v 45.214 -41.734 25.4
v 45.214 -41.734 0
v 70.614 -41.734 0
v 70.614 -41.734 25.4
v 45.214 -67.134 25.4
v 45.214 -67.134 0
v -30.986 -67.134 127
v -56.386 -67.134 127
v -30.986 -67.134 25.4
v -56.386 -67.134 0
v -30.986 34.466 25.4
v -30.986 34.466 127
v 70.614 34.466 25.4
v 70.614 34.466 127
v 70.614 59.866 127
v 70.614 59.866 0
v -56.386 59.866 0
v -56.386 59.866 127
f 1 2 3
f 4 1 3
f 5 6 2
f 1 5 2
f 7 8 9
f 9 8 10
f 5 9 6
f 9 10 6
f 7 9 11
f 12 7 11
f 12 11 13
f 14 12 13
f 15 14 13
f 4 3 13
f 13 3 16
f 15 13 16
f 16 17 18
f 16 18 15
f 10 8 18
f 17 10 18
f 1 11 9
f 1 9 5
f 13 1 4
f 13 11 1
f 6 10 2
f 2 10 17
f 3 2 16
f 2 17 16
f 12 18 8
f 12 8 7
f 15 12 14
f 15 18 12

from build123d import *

# Parameters (mm, degrees)
F0_W     = 127
F0_H     = 127
F1_DEPTH = 25.4
F2_W     = 25.4
F2_H     = 127
F3_DEPTH = 101.6
F4_W     = 101.6
F4_H     = 25.4
F5_DEPTH = 101.6
F6_W     = 25.4
F6_H     = 25.4
F7_DEPTH = 25.4


with BuildPart() as f1:
    # F0 (on Top) → F1 (new body)
    with BuildSketch(Plane.XY):
        with Locations((7.114284, -3.634389)):
            Rectangle(F0_W, F0_H)
    extrude(amount=F1_DEPTH)

    # F2 (on face) → F3 (join)
    with BuildSketch(Plane.XY.offset(25.4)):
        with Locations((-43.685716, -3.634389)):
            Rectangle(F2_W, F2_H)
    extrude(amount=F3_DEPTH)

    # F4 (on face) → F5 (join)
    with BuildSketch(Plane.XY.offset(25.4)):
        with Locations((19.814284, 47.165611)):
            Rectangle(F4_W, F4_H)
    extrude(amount=F5_DEPTH)

    # F6 (on face) → F7 (cut)
    with BuildSketch(Plane.XY.offset(25.4)):
        with Locations((57.914284, -54.434389)):
            Rectangle(F6_W, F6_H)
    extrude(amount=-F7_DEPTH, mode=Mode.SUBTRACT)


solid = f1.part
